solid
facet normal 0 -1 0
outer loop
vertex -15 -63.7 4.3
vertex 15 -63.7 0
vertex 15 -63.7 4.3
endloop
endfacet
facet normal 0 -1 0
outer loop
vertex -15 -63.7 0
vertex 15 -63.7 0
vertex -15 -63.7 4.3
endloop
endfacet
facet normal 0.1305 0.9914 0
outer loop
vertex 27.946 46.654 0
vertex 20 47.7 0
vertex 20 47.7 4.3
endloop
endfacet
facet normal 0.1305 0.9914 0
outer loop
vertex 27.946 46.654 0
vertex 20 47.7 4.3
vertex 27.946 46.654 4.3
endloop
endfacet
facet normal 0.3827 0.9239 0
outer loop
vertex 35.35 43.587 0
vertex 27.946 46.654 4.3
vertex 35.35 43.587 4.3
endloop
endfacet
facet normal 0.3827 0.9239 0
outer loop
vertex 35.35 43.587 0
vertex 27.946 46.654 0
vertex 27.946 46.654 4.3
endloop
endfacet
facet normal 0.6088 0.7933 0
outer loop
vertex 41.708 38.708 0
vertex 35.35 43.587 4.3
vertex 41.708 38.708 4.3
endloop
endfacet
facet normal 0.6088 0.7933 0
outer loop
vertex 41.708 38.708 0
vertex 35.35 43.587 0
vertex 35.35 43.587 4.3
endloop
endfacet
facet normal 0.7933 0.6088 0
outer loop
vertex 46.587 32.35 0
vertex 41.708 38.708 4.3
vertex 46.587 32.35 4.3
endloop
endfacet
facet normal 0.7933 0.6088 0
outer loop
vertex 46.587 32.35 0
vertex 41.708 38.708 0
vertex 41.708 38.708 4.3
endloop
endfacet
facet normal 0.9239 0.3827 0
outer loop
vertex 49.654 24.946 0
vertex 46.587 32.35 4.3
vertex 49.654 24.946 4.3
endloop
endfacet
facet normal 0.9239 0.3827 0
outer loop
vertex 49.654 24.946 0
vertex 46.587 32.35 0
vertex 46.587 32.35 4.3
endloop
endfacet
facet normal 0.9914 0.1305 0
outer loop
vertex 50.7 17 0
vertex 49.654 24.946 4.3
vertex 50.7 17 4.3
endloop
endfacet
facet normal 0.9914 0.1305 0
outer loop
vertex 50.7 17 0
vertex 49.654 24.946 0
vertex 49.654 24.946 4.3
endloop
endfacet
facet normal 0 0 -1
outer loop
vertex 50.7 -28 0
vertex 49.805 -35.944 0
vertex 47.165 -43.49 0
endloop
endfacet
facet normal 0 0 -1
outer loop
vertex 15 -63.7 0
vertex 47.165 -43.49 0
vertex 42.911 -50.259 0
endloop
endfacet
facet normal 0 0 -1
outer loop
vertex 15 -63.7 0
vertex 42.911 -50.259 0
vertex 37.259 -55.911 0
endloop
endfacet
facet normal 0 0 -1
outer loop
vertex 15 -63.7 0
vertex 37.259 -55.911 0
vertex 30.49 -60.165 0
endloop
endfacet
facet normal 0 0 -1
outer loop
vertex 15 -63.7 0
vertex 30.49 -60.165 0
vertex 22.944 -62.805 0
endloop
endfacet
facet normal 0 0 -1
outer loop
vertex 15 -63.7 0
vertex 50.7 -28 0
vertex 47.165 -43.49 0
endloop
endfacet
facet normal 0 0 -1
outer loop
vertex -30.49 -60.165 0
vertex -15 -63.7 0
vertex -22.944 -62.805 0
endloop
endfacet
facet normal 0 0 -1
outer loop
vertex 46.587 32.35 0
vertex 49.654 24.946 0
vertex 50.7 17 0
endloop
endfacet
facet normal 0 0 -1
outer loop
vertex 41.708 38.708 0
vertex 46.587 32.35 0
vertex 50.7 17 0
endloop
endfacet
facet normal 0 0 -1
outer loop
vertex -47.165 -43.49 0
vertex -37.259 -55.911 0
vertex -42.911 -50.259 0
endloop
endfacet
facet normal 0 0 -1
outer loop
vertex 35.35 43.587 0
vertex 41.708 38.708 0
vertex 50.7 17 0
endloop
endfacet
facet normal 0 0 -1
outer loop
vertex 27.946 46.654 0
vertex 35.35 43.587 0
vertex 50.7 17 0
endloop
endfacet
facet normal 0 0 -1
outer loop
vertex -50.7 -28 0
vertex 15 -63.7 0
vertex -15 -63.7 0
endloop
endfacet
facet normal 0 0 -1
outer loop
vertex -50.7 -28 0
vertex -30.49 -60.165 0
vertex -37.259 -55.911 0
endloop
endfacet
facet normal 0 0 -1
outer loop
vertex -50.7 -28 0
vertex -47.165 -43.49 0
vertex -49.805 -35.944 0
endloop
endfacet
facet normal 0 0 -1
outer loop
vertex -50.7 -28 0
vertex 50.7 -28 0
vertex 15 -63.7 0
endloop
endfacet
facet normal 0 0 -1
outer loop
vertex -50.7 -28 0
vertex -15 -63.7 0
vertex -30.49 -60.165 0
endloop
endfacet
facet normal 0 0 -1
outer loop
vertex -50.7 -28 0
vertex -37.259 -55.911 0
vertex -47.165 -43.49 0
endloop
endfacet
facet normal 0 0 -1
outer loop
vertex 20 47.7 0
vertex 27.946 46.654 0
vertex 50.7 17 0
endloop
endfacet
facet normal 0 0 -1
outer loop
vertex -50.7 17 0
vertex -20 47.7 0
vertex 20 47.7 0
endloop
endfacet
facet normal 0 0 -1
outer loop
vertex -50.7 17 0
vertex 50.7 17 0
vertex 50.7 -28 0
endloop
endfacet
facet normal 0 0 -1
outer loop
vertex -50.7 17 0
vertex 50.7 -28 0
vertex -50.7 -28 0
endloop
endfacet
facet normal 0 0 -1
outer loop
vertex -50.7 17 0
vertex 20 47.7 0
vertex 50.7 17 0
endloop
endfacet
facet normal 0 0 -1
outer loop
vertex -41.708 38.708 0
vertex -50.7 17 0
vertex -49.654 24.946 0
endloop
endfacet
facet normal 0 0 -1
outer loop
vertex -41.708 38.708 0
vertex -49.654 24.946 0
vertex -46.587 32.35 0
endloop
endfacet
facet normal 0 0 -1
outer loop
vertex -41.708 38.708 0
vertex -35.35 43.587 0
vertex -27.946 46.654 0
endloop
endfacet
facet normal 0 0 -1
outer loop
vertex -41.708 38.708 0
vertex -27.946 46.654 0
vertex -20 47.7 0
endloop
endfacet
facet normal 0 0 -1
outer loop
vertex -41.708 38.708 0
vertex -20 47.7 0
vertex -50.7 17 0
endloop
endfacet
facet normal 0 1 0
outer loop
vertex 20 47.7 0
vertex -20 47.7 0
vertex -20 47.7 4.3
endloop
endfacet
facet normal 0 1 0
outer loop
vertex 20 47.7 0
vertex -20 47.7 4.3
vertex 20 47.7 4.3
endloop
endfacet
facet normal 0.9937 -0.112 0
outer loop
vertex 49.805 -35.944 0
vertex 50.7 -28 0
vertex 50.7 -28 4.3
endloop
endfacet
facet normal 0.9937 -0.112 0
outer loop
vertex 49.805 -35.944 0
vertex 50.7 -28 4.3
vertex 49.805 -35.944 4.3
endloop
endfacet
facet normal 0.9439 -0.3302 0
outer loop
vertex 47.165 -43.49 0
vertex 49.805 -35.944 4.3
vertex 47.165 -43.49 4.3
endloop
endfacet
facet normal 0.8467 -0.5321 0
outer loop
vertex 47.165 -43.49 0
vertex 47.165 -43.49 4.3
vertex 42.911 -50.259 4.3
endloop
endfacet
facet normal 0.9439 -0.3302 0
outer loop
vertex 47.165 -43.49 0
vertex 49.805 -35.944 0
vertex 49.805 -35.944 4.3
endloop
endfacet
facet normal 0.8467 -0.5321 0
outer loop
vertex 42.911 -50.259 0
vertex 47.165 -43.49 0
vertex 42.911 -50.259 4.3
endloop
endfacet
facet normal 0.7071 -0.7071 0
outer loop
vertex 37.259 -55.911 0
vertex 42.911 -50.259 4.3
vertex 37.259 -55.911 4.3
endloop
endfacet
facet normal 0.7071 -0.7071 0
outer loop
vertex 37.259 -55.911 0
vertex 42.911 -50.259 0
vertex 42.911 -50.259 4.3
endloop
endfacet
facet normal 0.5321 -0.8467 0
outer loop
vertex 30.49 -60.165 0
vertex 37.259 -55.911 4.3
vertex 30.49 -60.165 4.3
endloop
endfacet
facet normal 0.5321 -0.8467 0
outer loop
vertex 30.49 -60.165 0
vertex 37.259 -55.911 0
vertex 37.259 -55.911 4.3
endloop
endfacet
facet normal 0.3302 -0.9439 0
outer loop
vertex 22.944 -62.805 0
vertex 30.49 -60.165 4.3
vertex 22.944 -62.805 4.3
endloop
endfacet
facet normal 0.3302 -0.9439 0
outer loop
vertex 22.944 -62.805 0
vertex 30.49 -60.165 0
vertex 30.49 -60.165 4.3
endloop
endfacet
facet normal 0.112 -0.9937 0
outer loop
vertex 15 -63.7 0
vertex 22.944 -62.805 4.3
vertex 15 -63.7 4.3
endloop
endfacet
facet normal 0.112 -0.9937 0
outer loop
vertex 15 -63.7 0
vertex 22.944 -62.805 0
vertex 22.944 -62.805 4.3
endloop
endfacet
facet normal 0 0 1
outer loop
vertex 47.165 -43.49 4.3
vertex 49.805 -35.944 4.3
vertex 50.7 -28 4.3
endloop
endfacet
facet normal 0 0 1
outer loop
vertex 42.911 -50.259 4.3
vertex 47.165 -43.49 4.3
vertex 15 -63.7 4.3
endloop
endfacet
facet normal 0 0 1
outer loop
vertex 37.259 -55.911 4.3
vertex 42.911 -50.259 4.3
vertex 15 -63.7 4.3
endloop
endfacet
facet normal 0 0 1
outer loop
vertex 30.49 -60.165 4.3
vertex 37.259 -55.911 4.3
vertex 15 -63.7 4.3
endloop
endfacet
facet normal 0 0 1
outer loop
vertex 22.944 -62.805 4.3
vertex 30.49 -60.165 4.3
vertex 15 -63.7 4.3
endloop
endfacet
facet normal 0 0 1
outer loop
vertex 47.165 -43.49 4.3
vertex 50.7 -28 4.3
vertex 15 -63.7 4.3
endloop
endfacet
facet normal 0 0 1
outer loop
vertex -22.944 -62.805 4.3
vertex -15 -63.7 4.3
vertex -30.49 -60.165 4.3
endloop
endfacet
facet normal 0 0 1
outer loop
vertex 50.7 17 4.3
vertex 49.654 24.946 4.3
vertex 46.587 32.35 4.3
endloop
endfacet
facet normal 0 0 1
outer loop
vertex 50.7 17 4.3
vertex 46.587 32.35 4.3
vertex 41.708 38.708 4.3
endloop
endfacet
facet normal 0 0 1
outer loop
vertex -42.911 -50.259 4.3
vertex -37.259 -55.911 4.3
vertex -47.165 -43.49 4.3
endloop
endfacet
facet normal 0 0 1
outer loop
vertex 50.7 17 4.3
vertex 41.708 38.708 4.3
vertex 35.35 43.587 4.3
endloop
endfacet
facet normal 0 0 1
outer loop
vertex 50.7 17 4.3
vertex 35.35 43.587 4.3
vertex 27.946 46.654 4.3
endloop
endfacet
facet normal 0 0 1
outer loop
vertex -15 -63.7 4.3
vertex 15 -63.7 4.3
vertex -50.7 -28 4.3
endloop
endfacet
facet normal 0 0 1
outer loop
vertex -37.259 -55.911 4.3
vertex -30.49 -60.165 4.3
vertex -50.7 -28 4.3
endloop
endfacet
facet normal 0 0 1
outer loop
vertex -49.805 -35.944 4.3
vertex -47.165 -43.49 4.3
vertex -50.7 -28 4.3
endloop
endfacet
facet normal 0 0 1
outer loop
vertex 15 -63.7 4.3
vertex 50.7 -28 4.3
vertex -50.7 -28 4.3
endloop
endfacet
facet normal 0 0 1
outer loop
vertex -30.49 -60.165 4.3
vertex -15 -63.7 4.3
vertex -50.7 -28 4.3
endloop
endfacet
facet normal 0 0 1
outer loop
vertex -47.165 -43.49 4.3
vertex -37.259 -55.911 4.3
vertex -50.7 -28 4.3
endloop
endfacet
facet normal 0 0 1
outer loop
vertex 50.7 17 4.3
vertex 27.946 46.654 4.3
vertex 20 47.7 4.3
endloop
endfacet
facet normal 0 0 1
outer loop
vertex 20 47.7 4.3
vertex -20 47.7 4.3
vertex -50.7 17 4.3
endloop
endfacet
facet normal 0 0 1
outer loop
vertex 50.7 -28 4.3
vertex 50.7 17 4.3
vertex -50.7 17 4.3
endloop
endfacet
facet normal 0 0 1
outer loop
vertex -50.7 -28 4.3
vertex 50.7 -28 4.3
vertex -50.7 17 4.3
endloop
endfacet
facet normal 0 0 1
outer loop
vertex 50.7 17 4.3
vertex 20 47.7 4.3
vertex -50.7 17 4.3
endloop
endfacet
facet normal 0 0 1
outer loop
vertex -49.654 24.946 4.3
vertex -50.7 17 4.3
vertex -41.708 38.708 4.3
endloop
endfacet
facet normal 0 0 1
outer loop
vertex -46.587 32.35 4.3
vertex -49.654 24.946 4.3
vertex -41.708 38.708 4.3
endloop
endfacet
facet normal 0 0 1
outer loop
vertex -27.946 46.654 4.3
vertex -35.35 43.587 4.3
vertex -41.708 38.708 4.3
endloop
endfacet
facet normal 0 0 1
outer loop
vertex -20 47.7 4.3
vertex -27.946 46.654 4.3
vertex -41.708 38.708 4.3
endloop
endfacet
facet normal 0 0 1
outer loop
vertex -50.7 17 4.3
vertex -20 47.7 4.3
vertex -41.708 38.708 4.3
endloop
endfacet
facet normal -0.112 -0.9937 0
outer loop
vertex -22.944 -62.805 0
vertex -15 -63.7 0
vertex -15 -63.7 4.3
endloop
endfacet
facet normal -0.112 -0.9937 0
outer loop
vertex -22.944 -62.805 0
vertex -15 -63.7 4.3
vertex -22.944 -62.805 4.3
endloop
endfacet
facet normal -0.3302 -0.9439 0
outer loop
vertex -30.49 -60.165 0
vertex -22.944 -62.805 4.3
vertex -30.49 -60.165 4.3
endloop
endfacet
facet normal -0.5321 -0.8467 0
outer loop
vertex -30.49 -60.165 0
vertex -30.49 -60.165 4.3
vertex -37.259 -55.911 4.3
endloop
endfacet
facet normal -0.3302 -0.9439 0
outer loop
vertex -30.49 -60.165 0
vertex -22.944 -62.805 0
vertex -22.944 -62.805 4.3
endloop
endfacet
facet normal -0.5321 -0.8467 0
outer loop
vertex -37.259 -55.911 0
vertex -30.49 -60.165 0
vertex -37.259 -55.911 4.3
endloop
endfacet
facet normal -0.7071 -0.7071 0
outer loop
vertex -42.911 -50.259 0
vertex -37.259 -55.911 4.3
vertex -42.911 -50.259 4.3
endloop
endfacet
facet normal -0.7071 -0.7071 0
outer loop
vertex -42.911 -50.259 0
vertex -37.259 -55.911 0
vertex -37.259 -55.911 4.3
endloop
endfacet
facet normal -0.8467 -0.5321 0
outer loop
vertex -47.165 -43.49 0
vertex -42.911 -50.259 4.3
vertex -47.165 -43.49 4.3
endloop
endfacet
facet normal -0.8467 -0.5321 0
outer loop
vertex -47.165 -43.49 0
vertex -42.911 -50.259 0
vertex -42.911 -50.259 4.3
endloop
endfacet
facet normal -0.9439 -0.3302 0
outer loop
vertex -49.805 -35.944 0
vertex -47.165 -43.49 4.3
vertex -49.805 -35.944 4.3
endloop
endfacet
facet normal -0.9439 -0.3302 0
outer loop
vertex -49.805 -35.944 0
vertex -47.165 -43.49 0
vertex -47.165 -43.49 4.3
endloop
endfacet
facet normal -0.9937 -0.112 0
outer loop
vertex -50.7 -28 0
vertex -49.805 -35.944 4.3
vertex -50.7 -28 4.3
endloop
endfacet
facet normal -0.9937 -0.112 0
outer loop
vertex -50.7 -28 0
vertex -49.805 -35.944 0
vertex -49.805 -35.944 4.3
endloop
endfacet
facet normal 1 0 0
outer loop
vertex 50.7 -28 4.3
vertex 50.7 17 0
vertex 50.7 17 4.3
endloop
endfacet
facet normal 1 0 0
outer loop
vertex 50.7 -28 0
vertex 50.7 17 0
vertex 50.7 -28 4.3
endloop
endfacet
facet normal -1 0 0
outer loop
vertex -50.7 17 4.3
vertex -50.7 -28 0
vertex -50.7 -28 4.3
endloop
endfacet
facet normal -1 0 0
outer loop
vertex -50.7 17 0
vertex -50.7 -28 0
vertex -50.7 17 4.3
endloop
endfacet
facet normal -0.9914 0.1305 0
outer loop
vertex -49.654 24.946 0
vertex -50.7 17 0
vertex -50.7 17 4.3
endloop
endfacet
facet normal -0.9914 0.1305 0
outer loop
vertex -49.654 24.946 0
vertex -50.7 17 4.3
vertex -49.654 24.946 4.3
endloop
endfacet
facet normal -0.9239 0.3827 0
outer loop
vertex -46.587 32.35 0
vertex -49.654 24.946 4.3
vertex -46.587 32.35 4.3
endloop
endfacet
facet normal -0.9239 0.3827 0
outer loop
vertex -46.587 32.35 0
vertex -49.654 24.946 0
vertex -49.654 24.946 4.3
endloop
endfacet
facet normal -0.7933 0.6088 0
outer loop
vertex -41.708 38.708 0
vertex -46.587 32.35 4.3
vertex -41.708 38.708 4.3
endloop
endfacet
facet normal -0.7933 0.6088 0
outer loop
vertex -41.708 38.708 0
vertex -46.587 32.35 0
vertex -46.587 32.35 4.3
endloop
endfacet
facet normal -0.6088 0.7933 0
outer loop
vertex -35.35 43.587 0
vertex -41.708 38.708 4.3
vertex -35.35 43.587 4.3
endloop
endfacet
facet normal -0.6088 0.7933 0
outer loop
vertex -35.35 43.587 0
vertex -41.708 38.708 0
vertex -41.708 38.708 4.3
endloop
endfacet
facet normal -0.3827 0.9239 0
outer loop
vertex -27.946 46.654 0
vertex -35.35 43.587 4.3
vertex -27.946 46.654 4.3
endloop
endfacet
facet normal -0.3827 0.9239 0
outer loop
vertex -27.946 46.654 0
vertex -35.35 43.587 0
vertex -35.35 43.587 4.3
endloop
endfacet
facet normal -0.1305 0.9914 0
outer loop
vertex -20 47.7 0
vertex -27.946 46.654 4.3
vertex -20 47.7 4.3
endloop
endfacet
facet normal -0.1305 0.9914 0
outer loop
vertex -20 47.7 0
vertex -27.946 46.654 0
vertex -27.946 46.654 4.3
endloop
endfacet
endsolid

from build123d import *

# Parameters (mm, degrees)
BOSS_EXTRUDE1_DEPTH = 4.3


with BuildPart() as part:
    # Sketch3 → Boss-Extrude1 (new body)
    with BuildSketch(Plane.XY):
        with BuildLine():
            Line((-20, 47.7), (20, 47.7))
            ThreePointArc((20, 47.7), (41.708178182, 38.708178182), (50.7, 17))
            Line((50.7, 17), (50.7, -28))
            ThreePointArc((50.7, -28), (40.243712088, -53.243712088), (15, -63.7))
            Line((15, -63.7), (0.5, -63.7))
            Line((0.5, -63.7), (-0.5, -63.7))
            Line((-0.5, -63.7), (-15, -63.7))
            ThreePointArc((-15, -63.7), (-40.243712088, -53.243712088), (-50.7, -28))
            Line((-50.7, -28), (-50.7, 17))
            ThreePointArc((-50.7, 17), (-41.708178182, 38.708178182), (-20, 47.7))
        make_face()
    extrude(amount=BOSS_EXTRUDE1_DEPTH)


solid = part.part
